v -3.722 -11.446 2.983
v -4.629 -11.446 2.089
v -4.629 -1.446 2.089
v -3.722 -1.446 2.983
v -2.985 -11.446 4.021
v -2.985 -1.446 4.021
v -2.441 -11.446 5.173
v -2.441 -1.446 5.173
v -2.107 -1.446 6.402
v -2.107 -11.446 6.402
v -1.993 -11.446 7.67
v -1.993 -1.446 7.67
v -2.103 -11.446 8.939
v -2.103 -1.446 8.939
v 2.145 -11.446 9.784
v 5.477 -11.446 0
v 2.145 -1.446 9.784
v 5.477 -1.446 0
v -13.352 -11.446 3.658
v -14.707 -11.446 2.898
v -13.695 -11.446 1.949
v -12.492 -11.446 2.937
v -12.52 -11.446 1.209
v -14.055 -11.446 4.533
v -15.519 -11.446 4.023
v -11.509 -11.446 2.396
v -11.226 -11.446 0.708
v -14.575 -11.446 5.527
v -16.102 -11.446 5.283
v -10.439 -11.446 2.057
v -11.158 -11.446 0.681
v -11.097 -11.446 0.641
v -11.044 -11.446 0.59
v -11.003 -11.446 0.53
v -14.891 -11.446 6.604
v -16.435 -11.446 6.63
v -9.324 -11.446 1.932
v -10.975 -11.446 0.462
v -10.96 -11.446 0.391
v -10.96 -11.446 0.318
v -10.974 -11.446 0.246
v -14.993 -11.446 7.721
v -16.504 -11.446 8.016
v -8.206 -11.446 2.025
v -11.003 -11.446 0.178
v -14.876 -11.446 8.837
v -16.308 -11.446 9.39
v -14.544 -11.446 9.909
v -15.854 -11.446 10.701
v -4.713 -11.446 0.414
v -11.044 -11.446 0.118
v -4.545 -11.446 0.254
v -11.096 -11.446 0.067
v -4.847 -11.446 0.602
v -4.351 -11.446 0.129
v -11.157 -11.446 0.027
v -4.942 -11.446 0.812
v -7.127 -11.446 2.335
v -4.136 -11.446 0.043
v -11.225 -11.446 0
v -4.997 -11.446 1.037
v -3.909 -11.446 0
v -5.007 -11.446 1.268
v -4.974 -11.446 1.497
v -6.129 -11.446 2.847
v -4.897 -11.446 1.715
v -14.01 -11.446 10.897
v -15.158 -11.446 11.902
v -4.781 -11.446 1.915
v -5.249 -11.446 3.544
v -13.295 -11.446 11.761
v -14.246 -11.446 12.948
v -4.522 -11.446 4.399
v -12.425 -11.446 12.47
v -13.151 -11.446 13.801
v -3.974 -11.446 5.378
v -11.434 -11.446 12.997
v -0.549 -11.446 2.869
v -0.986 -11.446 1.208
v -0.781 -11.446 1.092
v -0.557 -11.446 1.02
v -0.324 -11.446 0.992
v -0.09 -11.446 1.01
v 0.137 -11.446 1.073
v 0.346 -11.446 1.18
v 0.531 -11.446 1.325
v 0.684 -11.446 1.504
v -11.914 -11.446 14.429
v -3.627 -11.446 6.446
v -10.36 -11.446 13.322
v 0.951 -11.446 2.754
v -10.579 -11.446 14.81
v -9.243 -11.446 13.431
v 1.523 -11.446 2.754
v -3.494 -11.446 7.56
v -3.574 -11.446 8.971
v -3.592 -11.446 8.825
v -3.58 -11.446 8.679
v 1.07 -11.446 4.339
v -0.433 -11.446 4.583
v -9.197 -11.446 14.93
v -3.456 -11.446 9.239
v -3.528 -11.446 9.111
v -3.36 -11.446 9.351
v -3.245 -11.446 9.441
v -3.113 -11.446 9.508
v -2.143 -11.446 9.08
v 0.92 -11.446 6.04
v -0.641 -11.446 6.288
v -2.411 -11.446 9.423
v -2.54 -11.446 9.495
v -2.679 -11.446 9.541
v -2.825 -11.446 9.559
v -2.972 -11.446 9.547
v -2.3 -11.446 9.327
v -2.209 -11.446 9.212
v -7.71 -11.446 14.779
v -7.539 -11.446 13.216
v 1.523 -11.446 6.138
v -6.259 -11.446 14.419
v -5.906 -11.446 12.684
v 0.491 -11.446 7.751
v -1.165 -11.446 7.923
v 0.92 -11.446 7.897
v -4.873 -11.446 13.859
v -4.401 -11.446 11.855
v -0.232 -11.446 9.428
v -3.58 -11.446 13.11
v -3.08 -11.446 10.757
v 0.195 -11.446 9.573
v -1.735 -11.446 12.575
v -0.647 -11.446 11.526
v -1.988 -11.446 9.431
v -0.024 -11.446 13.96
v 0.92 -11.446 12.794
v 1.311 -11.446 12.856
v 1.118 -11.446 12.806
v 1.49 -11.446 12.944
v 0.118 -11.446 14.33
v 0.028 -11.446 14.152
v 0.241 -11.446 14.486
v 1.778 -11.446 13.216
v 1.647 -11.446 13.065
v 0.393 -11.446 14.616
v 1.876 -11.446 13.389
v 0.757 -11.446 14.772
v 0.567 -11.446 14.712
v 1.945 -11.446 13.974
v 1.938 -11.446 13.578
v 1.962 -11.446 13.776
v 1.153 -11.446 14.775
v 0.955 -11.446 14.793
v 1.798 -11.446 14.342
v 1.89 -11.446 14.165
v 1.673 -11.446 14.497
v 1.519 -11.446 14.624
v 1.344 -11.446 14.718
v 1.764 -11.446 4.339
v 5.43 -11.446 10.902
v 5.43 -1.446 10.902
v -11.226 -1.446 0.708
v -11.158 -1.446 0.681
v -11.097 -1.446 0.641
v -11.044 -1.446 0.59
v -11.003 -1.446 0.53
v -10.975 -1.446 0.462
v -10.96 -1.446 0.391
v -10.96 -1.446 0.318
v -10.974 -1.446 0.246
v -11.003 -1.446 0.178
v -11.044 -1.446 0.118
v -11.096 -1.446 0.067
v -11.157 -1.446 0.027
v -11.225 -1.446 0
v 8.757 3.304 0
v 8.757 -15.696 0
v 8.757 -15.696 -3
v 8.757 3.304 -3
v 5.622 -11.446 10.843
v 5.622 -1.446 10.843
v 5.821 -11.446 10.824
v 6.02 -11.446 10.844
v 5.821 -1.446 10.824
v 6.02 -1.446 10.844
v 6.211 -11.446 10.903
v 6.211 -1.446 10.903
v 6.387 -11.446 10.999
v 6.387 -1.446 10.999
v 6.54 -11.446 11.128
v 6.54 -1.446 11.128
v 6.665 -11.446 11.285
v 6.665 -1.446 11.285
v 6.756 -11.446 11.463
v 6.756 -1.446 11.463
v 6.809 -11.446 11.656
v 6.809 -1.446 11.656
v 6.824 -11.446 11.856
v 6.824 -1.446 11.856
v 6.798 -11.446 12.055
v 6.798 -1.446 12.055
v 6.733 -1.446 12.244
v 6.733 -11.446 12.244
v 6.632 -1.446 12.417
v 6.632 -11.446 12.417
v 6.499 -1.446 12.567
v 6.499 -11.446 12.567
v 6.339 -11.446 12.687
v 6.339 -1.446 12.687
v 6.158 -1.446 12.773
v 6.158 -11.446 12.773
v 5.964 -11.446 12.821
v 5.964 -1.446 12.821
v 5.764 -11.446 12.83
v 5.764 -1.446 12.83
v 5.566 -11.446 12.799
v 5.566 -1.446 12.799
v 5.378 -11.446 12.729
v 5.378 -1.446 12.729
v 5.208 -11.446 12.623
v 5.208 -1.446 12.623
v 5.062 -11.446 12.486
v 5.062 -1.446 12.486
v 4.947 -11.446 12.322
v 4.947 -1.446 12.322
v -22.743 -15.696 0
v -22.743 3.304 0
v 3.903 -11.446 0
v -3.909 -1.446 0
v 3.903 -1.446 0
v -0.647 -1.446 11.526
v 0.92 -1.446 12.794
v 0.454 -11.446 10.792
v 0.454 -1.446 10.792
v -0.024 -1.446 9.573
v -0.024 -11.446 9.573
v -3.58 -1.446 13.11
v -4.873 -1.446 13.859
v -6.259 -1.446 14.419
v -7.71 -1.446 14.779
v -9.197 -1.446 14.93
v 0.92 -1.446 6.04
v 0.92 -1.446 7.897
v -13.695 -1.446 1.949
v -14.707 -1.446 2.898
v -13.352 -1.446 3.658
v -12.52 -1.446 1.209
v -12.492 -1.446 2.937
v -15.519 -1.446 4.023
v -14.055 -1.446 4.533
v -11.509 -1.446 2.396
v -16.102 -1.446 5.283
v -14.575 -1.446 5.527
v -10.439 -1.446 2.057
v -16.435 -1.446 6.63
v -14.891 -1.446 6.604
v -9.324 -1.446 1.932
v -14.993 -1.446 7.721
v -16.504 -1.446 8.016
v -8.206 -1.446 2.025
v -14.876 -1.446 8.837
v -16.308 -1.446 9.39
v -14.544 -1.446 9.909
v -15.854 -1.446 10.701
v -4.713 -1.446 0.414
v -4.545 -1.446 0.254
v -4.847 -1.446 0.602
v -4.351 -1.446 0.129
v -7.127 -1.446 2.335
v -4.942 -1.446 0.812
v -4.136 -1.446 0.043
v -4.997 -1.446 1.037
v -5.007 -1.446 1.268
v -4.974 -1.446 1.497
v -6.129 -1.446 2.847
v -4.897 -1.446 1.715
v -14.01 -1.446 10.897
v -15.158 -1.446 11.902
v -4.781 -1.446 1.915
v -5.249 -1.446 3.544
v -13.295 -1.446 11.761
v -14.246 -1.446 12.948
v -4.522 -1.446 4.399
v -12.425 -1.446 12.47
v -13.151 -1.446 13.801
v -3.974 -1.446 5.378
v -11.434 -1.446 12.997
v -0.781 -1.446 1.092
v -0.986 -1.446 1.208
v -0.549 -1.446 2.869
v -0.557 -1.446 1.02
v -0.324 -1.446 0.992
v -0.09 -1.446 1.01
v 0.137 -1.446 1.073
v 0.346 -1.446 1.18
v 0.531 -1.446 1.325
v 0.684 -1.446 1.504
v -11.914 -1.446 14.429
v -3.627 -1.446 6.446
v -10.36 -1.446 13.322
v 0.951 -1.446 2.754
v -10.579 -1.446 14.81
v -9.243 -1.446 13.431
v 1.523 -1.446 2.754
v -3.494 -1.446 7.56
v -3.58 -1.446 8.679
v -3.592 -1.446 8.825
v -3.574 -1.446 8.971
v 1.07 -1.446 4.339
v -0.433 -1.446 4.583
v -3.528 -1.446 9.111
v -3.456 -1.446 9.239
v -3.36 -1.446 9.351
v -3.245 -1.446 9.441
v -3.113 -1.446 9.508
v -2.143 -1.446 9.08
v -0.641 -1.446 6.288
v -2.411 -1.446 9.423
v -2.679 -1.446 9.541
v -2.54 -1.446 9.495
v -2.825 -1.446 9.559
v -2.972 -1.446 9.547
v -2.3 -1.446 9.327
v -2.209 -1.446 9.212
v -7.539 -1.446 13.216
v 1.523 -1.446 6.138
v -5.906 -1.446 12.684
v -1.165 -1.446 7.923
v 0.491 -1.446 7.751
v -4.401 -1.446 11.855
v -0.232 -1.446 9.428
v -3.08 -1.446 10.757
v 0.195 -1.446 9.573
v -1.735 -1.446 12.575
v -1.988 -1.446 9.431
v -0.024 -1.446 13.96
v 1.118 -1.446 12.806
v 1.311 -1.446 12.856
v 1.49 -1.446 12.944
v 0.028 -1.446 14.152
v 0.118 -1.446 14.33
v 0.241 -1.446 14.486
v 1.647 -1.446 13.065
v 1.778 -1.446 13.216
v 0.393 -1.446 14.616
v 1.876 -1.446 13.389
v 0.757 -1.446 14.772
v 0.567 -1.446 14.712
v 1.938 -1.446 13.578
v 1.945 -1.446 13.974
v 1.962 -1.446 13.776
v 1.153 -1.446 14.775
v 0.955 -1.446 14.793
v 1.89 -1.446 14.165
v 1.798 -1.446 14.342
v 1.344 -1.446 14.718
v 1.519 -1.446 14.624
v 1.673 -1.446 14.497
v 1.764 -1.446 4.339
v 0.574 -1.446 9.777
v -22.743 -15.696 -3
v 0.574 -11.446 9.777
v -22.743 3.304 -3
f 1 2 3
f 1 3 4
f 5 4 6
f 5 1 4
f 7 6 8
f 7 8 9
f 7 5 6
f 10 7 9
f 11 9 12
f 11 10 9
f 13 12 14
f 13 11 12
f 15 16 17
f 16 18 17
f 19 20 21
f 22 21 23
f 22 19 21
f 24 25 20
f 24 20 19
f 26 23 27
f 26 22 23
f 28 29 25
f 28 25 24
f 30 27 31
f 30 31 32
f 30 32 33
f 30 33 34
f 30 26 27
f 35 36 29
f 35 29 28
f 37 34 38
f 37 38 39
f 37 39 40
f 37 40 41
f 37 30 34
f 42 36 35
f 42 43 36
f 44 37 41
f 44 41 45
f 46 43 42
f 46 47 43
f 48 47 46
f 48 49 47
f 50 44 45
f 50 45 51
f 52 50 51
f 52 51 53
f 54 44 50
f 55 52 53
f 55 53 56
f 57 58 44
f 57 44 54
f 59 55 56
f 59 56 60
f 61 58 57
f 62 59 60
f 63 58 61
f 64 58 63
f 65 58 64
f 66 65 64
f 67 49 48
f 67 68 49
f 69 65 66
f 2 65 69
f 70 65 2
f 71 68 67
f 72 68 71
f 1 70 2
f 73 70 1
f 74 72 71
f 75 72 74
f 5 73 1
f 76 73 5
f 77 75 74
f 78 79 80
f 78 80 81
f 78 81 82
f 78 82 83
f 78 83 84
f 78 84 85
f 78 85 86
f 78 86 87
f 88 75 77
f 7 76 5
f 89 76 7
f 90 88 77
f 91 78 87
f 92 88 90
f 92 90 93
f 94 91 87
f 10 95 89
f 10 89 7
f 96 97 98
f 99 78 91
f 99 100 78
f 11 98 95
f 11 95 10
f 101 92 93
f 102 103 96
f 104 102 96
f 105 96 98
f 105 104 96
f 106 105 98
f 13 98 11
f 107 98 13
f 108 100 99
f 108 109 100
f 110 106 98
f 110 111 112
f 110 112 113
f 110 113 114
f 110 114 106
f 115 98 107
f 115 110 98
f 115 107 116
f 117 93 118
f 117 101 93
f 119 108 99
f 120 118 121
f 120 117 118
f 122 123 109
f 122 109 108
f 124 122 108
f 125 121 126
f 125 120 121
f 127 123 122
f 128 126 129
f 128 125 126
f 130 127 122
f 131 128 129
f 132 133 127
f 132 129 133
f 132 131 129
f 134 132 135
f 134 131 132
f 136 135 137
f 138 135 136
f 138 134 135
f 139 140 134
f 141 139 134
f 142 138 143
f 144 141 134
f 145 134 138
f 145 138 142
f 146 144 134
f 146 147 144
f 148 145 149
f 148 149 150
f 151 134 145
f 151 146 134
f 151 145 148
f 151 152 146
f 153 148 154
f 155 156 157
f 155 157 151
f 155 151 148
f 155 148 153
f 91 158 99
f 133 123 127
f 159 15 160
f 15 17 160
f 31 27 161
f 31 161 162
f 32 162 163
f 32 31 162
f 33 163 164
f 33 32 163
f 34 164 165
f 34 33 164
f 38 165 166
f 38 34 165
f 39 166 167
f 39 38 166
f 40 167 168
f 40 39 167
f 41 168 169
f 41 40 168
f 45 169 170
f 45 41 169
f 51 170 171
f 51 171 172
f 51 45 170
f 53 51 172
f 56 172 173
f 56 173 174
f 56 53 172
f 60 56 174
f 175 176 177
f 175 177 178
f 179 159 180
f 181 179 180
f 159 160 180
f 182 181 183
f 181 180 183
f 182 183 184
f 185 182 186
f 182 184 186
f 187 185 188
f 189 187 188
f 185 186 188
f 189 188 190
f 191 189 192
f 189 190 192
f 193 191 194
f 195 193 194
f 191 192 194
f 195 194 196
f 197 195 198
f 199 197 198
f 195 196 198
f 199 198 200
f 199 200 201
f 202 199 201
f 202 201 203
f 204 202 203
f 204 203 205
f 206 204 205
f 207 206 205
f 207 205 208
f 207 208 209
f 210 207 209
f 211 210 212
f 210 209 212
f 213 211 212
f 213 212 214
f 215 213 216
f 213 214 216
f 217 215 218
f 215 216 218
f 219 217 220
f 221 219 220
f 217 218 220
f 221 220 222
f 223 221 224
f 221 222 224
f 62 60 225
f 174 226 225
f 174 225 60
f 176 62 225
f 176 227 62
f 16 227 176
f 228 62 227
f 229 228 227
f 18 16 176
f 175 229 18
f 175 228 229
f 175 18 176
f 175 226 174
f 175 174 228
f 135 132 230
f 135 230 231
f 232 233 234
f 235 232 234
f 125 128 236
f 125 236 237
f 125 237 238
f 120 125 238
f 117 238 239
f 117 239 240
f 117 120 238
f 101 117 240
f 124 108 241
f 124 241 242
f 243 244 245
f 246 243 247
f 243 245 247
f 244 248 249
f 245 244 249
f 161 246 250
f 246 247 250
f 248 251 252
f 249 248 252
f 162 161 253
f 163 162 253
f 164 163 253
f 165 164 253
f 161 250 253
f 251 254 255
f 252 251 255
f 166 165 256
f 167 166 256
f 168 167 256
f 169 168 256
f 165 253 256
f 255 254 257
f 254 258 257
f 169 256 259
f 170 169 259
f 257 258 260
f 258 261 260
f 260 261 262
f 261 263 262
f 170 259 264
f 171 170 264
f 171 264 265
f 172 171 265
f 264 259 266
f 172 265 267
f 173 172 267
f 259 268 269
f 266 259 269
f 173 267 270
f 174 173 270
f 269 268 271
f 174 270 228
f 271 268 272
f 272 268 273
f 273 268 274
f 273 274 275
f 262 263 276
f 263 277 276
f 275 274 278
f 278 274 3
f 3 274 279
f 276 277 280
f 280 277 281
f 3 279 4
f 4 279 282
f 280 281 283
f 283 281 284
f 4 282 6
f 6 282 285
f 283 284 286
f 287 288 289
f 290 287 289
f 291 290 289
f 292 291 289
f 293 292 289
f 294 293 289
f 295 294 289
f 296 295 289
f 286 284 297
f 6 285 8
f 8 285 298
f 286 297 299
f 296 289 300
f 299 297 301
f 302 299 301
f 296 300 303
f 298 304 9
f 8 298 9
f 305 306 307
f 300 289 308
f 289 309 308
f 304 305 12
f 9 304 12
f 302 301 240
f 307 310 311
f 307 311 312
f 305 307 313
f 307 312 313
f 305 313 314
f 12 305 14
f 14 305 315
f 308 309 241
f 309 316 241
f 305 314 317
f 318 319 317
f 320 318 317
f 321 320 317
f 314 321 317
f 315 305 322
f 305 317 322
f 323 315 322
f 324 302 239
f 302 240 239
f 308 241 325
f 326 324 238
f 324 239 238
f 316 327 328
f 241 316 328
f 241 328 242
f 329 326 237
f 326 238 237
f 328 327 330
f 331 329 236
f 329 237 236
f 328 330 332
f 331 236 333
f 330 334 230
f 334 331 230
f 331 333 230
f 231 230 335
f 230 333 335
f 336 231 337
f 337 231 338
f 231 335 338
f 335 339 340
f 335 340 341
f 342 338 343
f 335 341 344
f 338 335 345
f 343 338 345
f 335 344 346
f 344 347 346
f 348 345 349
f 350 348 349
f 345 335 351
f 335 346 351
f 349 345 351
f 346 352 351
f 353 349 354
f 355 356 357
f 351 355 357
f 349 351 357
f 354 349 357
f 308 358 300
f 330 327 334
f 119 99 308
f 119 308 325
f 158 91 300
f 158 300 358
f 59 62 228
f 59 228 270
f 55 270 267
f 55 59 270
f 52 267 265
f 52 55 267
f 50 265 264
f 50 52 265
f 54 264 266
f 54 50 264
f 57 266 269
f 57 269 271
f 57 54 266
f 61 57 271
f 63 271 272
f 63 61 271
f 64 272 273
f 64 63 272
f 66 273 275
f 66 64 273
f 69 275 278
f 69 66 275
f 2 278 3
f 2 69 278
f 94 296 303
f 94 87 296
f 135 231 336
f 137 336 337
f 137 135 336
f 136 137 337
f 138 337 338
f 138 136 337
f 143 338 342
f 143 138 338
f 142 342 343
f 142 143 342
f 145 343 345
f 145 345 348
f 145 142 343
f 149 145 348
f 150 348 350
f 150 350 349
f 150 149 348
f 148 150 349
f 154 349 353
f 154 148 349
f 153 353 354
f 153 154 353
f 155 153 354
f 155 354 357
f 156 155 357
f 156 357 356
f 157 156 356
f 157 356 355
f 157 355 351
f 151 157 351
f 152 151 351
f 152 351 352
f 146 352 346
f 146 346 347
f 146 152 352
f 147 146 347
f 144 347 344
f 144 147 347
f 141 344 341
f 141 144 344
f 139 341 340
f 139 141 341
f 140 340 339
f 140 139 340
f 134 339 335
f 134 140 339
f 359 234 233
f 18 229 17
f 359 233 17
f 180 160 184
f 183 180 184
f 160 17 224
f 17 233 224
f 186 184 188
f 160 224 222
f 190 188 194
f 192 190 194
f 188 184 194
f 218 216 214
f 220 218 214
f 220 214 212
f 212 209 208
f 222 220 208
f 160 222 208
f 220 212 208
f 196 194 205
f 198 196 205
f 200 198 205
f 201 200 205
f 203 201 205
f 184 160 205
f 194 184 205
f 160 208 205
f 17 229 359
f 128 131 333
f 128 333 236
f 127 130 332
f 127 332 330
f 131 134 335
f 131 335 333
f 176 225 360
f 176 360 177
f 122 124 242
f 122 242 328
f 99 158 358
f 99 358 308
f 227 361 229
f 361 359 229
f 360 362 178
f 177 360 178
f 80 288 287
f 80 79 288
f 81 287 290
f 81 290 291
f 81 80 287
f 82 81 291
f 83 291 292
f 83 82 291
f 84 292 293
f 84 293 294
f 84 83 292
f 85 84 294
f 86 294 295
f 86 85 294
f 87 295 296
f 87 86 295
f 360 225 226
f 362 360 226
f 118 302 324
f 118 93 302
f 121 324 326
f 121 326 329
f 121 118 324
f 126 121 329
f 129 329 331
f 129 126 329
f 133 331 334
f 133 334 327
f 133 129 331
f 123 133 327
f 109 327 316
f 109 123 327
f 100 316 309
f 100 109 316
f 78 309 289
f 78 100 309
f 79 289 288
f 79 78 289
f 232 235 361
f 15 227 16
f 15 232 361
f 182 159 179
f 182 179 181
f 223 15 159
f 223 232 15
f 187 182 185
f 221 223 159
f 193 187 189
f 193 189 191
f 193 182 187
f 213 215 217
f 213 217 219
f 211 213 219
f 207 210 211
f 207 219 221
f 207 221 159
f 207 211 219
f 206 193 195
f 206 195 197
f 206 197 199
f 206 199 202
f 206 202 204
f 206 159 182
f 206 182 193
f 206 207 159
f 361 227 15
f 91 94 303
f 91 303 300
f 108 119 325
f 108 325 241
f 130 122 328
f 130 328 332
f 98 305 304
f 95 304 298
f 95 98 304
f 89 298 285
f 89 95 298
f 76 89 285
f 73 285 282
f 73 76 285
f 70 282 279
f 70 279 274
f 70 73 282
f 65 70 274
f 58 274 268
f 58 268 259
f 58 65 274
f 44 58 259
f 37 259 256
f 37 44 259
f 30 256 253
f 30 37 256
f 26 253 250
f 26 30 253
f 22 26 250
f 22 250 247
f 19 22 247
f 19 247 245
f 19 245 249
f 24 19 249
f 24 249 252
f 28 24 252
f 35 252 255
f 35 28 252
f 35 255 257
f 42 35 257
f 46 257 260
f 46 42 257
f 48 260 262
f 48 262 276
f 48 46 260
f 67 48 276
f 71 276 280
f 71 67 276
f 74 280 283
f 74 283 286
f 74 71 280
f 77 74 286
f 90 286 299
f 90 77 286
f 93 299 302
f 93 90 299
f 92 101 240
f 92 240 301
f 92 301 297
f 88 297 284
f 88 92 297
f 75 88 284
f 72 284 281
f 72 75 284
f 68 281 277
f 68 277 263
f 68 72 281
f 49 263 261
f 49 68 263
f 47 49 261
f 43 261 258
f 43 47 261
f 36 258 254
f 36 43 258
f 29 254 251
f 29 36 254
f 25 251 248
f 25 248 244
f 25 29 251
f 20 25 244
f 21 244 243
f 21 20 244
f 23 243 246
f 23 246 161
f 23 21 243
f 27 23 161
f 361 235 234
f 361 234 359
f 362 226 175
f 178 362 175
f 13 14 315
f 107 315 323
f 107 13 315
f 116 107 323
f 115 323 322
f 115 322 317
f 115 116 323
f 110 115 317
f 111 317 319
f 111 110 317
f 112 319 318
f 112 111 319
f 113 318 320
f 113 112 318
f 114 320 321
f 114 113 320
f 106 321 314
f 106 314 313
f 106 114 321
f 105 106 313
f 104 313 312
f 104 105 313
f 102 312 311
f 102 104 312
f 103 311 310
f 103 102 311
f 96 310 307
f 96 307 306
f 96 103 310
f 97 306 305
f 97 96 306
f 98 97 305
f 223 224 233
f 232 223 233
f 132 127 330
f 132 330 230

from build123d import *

# Parameters (mm, degrees)
ESQUISSE1_W      = 31.5
ESQUISSE1_H      = 19
EXTRUSION1_DEPTH = 3
EXTRUSION2_DEPTH = 5


with BuildPart() as part:
    # Esquisse1 → Extrusion1 (new body)
    with BuildSketch(Plane.XY):
        with Locations((-6.993175074, -6.195994065)):
            Rectangle(ESQUISSE1_W, ESQUISSE1_H)
    extrude(amount=-EXTRUSION1_DEPTH)

    # Esquisse2 → Extrusion2 (add, symmetric)
    with BuildSketch(Plane(origin=(0, -6.445994065, 0), x_dir=(-1, 0, 0), z_dir=(0, 1, 0))):
        with BuildLine():
            Line((-0.683946914, 1.503708235), (-1.522862282, 2.753870501))
            Line((-1.522862282, 2.753870501), (-0.951110198, 2.753870501))
            Line((-0.951110198, 2.753870501), (-1.764464322, 4.339195483))
            Line((-1.764464322, 4.339195483), (-1.070373593, 4.339195483))
            Line((-1.070373593, 4.339195483), (-1.522862282, 6.137827556))
            Line((-1.522862282, 6.137827556), (-0.919586302, 6.039619438))
            Line((-0.919586302, 6.039619438), (-0.919586302, 7.896542483))
            Line((-0.919586302, 7.896542483), (-0.491311221, 7.750686861))
            Line((-0.491311221, 7.750686861), (-0.194631359, 9.573141446))
            Line((-0.194631359, 9.573141446), (0.23155106, 9.427998511))
            Line((0.23155106, 9.427998511), (0.646902561, 11.526197473))
            Line((0.646902561, 11.526197473), (-0.919586302, 12.794183433))
            ThreePointArc((-0.919586302, 12.794183433), (-1.739109574, 14.422451612), (0.024155253, 13.960095898))
            Line((0.024155253, 13.960095898), (1.735137514, 12.575150538))
            Line((1.735137514, 12.575150538), (3.580381554, 13.110240468))
            ThreePointArc((3.580381554, 13.110240468), (6.259156873, 14.419297059), (9.196563315, 14.930286061))
            ThreePointArc((9.196563315, 14.930286061), (16.439211341, 8.707680897), (11.226331582, 0.70751527))
            ThreePointArc((11.226331582, 0.70751527), (10.958201165, 0.354142581), (11.225313893, 0))
            Line((11.225313893, 0), (3.908893256, 0))
            ThreePointArc((3.908893256, 0), (4.942460115, 0.812425826), (4.628744056, 2.089092739))
            ThreePointArc((4.628744056, 2.089092739), (2.440830828, 5.172896926), (2.103130606, 8.938898932))
            ThreePointArc((2.103130606, 8.938898932), (2.971882266, 9.547397538), (3.580380872, 8.678645878))
            ThreePointArc((3.580380872, 8.678645878), (12.939531774, 3.276526542), (9.243174696, 13.431010442))
            ThreePointArc((9.243174696, 13.431010442), (1.988346124, 9.431080483), (0.985709709, 1.207535171))
            ThreePointArc((0.985709709, 1.207535171), (0.089542016, 1.009824881), (-0.683946914, 1.503708235))
        make_face()
        with BuildLine():
            Line((0.024155253, 9.573141446), (-0.573596034, 9.77671478))
            Line((-0.573596034, 9.77671478), (-3.903205639, 0))
            Line((-3.903205639, 0), (-5.477057205, 0))
            Line((-5.477057205, 0), (-2.145067788, 9.78370261))
            Line((-2.145067788, 9.78370261), (-5.43013268, 10.902481655))
            ThreePointArc((-5.43013268, 10.902481655), (-6.770419213, 12.151238044), (-4.946559165, 12.322395968))
            Line((-4.946559165, 12.322395968), (-0.453501716, 10.7922166))
            Line((-0.453501716, 10.7922166), (0.024155253, 9.573141446))
        make_face()
    extrude(amount=EXTRUSION2_DEPTH, both=True)


solid = part.part
